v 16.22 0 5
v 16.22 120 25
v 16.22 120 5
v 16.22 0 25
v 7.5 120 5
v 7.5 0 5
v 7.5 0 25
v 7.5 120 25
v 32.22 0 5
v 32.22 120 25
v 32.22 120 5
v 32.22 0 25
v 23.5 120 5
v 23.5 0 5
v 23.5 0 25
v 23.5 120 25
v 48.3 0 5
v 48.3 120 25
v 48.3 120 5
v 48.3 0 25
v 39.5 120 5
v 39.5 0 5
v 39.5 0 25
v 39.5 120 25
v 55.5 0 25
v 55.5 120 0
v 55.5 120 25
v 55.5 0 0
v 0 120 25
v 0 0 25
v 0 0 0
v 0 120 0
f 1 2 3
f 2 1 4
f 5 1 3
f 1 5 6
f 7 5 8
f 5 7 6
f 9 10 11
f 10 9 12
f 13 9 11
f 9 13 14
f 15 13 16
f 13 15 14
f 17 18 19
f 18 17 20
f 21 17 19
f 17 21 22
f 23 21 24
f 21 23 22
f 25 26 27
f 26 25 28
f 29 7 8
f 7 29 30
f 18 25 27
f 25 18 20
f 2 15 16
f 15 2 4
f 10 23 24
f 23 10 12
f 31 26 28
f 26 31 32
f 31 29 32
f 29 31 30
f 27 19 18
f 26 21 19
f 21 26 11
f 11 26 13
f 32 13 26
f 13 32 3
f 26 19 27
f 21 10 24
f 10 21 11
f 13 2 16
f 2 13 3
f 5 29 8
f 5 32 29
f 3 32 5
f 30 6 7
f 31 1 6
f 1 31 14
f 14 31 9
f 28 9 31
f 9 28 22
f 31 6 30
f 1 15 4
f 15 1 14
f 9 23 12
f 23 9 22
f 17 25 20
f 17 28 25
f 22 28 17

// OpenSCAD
// Numbers you need to change to adapt to your cutting boards
widths = [8.57 + .15, 8.57 + .15, 8.57 + .23];
offset = 7.5;
period = 16;
holder_width = 120;
total_height = 25;

// Numbers that change the style
bottom_height_proportion = 0.2;

// End of configuration

eps = 0.1; // epsilon (any small number)

scale([1, holder_width, total_height]) {
  difference() {
    cube(size=[offset + len(widths)*period, 1, 1]);
    for (i = [0 : len(widths)-1]) {

      translate([offset + i*period, -eps, bottom_height_proportion])
        cube(size=[widths[i], 1+2*eps, 1]);
    }
  }
}
